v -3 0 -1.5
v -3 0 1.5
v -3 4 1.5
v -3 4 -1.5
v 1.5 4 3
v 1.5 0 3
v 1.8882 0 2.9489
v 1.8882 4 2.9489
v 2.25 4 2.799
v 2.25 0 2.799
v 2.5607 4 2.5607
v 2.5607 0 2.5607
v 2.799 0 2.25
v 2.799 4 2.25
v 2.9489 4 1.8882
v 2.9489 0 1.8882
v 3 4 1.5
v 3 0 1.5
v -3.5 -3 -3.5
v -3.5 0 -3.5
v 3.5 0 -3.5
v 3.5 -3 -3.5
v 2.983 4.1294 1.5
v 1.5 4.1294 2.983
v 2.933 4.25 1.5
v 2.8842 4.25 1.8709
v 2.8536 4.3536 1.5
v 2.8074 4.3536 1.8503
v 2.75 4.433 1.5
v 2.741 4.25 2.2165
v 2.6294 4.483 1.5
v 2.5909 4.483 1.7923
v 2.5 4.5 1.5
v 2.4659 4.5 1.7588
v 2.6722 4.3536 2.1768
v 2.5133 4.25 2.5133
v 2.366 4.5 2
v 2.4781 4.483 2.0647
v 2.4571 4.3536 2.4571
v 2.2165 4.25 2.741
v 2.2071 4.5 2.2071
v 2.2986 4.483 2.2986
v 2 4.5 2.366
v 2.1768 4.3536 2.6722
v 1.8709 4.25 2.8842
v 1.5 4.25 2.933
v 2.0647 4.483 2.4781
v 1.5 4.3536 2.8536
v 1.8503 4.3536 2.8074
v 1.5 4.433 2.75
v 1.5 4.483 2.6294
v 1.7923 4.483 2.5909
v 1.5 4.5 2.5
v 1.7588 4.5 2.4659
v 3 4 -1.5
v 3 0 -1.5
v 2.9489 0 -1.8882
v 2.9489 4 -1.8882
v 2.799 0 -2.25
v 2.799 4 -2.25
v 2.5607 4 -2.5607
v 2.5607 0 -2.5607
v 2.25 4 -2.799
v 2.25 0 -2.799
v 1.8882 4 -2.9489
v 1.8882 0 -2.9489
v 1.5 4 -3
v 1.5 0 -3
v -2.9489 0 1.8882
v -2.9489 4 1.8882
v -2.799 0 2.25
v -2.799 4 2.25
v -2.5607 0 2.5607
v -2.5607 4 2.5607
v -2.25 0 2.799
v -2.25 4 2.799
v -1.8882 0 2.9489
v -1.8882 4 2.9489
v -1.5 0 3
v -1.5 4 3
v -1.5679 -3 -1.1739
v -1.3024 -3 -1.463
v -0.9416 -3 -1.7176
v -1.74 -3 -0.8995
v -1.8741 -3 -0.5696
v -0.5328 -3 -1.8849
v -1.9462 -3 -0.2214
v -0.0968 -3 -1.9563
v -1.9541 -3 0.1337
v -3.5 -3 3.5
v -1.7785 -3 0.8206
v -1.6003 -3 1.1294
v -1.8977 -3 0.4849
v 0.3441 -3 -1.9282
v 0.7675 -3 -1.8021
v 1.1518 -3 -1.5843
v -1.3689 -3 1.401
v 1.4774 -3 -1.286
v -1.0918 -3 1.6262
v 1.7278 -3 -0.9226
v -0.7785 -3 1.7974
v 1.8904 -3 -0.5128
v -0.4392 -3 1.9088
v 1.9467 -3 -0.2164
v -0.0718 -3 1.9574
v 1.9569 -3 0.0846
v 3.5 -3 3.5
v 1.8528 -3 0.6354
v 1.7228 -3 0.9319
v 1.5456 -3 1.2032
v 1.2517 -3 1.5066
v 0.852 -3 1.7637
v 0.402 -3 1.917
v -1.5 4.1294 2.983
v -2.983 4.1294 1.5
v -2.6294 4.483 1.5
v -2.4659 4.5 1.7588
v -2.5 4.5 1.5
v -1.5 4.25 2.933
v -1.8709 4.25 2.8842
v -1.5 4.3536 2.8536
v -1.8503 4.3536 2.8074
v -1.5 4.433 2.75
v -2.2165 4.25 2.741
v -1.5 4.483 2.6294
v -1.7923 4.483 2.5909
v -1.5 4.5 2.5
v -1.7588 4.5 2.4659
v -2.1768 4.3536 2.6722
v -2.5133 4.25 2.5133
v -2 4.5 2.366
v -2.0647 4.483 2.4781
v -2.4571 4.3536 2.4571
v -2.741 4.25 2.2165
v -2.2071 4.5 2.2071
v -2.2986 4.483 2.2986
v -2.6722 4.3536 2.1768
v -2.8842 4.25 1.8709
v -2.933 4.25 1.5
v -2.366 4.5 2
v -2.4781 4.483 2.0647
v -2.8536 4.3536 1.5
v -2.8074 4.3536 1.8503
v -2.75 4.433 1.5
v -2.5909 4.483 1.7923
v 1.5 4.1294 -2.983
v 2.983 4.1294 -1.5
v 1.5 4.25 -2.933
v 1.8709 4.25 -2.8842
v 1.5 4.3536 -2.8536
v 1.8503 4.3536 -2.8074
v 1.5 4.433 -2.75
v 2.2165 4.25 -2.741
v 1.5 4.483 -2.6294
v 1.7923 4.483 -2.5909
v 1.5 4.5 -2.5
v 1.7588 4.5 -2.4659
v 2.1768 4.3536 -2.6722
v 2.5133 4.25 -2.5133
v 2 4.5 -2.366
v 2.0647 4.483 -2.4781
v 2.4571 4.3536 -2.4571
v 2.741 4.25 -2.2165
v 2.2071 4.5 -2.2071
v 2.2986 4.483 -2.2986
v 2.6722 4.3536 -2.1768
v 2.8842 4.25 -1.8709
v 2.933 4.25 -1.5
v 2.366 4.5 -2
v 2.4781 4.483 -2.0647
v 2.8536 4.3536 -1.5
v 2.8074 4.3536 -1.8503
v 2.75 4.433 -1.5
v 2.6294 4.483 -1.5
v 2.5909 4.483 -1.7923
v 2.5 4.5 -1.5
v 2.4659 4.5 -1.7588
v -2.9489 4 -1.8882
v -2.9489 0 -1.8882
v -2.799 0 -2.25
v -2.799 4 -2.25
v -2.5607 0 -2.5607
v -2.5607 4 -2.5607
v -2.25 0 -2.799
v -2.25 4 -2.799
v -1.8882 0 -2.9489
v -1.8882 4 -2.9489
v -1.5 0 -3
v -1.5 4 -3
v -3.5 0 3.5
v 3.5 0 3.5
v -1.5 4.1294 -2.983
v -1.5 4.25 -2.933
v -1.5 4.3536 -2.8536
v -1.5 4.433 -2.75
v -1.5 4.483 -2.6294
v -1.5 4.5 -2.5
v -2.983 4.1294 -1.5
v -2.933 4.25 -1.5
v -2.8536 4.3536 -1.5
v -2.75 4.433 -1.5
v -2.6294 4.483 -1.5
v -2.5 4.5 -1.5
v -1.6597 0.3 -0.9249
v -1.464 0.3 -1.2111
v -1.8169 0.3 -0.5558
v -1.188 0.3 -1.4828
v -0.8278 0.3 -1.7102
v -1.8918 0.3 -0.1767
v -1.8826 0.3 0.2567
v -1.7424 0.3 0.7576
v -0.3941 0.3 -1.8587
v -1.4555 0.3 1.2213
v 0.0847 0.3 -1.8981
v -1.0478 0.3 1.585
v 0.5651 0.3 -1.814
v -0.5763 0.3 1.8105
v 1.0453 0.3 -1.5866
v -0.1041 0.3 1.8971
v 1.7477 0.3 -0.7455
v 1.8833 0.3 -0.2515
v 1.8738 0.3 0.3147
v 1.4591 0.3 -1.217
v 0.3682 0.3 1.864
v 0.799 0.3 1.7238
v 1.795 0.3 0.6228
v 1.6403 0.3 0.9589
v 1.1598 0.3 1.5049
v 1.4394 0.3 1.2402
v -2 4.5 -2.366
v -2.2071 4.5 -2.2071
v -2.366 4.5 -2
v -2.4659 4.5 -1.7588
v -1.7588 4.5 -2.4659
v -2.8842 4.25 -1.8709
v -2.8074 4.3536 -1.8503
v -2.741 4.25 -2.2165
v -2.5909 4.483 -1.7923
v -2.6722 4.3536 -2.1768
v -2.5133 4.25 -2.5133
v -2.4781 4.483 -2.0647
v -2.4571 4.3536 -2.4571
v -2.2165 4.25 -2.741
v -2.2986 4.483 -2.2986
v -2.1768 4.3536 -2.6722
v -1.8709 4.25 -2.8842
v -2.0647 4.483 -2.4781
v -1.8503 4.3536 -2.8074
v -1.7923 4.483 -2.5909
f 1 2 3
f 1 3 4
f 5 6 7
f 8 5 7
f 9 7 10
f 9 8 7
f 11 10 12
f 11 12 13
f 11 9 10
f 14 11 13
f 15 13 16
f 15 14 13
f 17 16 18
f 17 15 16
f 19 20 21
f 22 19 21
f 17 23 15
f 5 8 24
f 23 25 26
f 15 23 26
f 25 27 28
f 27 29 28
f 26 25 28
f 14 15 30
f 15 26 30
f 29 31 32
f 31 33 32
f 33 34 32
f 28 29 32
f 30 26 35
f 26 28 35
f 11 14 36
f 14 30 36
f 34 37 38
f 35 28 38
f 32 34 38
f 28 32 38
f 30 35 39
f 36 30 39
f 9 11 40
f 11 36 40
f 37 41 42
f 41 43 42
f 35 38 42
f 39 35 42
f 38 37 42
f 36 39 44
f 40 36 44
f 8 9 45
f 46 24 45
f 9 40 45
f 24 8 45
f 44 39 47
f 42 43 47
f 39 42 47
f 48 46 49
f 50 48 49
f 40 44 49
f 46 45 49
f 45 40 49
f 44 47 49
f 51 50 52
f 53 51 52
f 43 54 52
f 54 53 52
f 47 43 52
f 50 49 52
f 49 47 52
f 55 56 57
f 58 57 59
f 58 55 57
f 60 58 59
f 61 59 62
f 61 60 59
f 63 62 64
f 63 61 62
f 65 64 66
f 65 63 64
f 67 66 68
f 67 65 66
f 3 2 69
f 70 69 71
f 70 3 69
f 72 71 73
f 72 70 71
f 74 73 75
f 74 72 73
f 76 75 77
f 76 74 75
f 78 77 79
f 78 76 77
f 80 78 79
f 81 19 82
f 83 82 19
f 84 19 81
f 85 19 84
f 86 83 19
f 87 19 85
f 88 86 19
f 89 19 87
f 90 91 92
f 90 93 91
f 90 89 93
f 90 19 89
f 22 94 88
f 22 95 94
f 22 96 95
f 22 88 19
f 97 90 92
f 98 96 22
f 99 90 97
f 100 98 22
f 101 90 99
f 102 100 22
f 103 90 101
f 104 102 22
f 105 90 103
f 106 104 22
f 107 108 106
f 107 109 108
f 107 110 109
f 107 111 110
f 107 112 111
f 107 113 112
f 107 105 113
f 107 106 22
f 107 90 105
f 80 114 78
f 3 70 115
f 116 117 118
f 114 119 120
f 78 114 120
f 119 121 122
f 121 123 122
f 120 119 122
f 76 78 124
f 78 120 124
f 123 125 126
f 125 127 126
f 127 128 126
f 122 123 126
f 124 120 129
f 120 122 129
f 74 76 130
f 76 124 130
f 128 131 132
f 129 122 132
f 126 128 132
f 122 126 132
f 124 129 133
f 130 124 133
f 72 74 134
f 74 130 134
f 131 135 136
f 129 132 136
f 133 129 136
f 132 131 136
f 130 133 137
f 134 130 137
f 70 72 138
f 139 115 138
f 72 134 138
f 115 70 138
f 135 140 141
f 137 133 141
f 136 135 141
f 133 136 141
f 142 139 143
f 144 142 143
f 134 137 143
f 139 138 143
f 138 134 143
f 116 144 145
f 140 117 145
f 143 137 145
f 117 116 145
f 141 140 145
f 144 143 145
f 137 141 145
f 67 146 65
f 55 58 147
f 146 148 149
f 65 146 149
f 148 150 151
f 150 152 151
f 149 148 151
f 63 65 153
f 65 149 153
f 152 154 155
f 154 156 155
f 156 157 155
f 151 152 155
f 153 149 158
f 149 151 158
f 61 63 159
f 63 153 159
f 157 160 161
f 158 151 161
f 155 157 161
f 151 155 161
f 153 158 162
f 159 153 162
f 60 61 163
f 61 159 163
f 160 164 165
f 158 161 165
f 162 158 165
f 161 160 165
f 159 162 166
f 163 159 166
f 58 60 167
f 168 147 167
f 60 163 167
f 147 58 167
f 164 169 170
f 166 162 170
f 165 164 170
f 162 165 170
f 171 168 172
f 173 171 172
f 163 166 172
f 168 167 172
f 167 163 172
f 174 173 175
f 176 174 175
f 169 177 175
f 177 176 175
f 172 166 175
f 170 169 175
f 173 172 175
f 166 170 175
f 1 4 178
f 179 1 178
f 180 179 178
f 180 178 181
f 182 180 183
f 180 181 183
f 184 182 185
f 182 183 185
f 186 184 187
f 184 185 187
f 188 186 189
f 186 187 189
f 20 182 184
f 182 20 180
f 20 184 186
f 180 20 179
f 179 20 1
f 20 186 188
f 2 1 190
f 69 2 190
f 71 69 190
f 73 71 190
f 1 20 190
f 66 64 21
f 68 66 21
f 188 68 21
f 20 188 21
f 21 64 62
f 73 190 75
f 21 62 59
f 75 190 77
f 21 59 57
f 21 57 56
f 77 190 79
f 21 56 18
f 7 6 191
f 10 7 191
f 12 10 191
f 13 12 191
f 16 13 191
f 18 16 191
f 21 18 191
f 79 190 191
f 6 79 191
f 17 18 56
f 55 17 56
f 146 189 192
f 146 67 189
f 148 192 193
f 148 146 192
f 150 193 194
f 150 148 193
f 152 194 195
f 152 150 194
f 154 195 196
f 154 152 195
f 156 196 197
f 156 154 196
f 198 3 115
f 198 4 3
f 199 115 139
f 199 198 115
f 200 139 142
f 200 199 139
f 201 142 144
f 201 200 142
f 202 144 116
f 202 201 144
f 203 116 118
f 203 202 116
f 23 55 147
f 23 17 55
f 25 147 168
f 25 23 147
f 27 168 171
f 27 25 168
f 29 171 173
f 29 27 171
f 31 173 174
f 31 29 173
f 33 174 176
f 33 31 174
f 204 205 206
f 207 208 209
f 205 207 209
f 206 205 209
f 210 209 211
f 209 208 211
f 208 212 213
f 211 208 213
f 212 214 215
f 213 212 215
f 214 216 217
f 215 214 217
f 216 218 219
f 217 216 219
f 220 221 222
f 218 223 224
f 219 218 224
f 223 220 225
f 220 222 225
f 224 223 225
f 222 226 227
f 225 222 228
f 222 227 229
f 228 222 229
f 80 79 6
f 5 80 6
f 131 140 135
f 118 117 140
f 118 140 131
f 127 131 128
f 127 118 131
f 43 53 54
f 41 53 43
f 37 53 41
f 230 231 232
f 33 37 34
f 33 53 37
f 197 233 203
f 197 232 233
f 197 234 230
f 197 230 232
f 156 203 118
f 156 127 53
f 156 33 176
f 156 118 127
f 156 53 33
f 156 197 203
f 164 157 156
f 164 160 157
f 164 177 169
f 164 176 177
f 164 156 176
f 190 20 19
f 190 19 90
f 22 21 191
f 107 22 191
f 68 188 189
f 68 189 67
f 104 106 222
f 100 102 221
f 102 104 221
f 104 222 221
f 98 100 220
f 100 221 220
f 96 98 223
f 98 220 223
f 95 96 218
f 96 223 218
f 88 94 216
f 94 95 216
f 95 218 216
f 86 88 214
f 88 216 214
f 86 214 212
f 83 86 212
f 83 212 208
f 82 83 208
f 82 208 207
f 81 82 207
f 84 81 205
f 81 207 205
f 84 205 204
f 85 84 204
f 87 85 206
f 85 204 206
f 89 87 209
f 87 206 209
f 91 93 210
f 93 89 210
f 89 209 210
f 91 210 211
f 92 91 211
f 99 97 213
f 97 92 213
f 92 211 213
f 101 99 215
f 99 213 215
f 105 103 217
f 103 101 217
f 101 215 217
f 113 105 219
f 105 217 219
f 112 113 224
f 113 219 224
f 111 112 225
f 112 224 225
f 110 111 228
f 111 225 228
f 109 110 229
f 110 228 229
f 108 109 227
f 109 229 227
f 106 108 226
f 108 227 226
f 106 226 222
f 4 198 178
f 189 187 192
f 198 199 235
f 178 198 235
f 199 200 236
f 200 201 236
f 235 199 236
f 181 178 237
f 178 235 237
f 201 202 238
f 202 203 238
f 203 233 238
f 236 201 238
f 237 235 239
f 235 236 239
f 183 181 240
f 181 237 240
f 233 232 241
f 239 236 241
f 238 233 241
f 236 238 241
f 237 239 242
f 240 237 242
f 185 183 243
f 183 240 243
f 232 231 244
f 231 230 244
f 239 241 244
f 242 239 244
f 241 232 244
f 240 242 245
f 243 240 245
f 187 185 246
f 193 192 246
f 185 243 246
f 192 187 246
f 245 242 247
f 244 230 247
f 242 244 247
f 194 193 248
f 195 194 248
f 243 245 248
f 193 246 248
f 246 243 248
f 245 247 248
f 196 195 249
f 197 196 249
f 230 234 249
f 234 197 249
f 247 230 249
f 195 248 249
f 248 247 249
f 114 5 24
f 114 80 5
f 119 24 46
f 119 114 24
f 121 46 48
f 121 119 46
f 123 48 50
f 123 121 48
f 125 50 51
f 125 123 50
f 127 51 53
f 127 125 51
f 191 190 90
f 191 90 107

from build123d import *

# Parameters (mm, degrees)
SKETCH_1_W          = 6
SKETCH_1_H          = 6
EXTRUDE_1_DEPTH     = 4.5
FILLET_1_R          = 1.5
FILLET_3_R          = 0.5
SKETCH_2_W          = 7
SKETCH_2_H          = 7
EXTRUDE_2_DEPTH     = 4.7
SKETCH_5_W          = 7
SKETCH_5_H          = 7
CUT_EXTRUDE_1_DEPTH = 1.7


with BuildPart() as part:
    # 草图1 → 凸台-拉伸1 (new body)
    with BuildSketch(Plane(origin=(0, 0, 0), x_dir=(1, 0, 0), z_dir=(0, 1, 0))):
        Rectangle(SKETCH_1_W, SKETCH_1_H)
    extrude(amount=EXTRUDE_1_DEPTH)

    # 圆角1
    fillet_1_edges = [part.edges().sort_by_distance(p)[0] for p in [
        (3, 2.25, 3),
        (-3, 2.25, 3),
        (-3, 2.25, -3),
        (3, 2.25, -3),
    ]]
    fillet(fillet_1_edges, radius=FILLET_1_R)

    # 圆角3
    fillet_3_edges = [part.edges().sort_by_distance(p)[0] for p in [
        (-3, 4.5, 0),
        (0, 4.5, -3),
        (3, 4.5, 0),
        (0, 4.5, 3),
        (-2.560660172, 4.5, 2.560660172),
        (2.560660172, 4.5, 2.560660172),
        (2.560660172, 4.5, -2.560660172),
        (-2.560660172, 4.5, -2.560660172),
    ]]
    fillet(fillet_3_edges, radius=FILLET_3_R)

    # 草图2 → 凸台-拉伸2 (add)
    with BuildSketch(Plane.XZ):
        Rectangle(SKETCH_2_W, SKETCH_2_H)
    extrude(amount=EXTRUDE_2_DEPTH)

    # 切除-放样1: read off the stored shape, not the designer's step
    # 切除-放样1: loft between two sections, ruled curve by curve
    loft_1_from = [
        Edge.make_bspline([(1.999712209, -4.7, -0.033927573), (1.931857063, -4.7, -4.033351992), (-2.067567356, -4.7, -3.965496845), (-1.999712209, -4.7, 0.033927573), (-1.931857063, -4.7, 4.033351992), (2.067567356, -4.7, 3.965496845), (1.999712209, -4.7, -0.033927573)], [0, 0, 0, 0, 0.5, 0.5, 0.5, 1, 1, 1, 1], 3, [1, 0.333333333, 0.333333333, 1, 0.333333333, 0.333333333, 1]),
    ]
    loft_1_to = [
        Edge.make_bspline([(1.873751703, 0.3, 0.314729335), (2.503210373, 0.3, -3.432774072), (-1.244293034, 0.3, -4.062232741), (-1.873751703, 0.3, -0.314729335), (-2.503210373, 0.3, 3.432774072), (1.244293034, 0.3, 4.062232741), (1.873751703, 0.3, 0.314729335)], [0, 0, 0, 0, 0.5, 0.5, 0.5, 1, 1, 1, 1], 3, [1, 0.333333333, 0.333333333, 1, 0.333333333, 0.333333333, 1]),
    ]
    loft_1 = Solid(Shell([*[Face.make_surface_from_curves(loft_1_from[k], loft_1_to[k]) for k in range(1)], Face(Wire(loft_1_from)), Face(Wire(loft_1_to))]))
    add(loft_1, mode=Mode.SUBTRACT)

    # 草图5 → 切除-拉伸1 (cut)
    with BuildSketch(Plane.XZ.offset(4.7)):
        Rectangle(SKETCH_5_W, SKETCH_5_H)
    extrude(amount=-CUT_EXTRUDE_1_DEPTH, mode=Mode.SUBTRACT)


solid = part.part
